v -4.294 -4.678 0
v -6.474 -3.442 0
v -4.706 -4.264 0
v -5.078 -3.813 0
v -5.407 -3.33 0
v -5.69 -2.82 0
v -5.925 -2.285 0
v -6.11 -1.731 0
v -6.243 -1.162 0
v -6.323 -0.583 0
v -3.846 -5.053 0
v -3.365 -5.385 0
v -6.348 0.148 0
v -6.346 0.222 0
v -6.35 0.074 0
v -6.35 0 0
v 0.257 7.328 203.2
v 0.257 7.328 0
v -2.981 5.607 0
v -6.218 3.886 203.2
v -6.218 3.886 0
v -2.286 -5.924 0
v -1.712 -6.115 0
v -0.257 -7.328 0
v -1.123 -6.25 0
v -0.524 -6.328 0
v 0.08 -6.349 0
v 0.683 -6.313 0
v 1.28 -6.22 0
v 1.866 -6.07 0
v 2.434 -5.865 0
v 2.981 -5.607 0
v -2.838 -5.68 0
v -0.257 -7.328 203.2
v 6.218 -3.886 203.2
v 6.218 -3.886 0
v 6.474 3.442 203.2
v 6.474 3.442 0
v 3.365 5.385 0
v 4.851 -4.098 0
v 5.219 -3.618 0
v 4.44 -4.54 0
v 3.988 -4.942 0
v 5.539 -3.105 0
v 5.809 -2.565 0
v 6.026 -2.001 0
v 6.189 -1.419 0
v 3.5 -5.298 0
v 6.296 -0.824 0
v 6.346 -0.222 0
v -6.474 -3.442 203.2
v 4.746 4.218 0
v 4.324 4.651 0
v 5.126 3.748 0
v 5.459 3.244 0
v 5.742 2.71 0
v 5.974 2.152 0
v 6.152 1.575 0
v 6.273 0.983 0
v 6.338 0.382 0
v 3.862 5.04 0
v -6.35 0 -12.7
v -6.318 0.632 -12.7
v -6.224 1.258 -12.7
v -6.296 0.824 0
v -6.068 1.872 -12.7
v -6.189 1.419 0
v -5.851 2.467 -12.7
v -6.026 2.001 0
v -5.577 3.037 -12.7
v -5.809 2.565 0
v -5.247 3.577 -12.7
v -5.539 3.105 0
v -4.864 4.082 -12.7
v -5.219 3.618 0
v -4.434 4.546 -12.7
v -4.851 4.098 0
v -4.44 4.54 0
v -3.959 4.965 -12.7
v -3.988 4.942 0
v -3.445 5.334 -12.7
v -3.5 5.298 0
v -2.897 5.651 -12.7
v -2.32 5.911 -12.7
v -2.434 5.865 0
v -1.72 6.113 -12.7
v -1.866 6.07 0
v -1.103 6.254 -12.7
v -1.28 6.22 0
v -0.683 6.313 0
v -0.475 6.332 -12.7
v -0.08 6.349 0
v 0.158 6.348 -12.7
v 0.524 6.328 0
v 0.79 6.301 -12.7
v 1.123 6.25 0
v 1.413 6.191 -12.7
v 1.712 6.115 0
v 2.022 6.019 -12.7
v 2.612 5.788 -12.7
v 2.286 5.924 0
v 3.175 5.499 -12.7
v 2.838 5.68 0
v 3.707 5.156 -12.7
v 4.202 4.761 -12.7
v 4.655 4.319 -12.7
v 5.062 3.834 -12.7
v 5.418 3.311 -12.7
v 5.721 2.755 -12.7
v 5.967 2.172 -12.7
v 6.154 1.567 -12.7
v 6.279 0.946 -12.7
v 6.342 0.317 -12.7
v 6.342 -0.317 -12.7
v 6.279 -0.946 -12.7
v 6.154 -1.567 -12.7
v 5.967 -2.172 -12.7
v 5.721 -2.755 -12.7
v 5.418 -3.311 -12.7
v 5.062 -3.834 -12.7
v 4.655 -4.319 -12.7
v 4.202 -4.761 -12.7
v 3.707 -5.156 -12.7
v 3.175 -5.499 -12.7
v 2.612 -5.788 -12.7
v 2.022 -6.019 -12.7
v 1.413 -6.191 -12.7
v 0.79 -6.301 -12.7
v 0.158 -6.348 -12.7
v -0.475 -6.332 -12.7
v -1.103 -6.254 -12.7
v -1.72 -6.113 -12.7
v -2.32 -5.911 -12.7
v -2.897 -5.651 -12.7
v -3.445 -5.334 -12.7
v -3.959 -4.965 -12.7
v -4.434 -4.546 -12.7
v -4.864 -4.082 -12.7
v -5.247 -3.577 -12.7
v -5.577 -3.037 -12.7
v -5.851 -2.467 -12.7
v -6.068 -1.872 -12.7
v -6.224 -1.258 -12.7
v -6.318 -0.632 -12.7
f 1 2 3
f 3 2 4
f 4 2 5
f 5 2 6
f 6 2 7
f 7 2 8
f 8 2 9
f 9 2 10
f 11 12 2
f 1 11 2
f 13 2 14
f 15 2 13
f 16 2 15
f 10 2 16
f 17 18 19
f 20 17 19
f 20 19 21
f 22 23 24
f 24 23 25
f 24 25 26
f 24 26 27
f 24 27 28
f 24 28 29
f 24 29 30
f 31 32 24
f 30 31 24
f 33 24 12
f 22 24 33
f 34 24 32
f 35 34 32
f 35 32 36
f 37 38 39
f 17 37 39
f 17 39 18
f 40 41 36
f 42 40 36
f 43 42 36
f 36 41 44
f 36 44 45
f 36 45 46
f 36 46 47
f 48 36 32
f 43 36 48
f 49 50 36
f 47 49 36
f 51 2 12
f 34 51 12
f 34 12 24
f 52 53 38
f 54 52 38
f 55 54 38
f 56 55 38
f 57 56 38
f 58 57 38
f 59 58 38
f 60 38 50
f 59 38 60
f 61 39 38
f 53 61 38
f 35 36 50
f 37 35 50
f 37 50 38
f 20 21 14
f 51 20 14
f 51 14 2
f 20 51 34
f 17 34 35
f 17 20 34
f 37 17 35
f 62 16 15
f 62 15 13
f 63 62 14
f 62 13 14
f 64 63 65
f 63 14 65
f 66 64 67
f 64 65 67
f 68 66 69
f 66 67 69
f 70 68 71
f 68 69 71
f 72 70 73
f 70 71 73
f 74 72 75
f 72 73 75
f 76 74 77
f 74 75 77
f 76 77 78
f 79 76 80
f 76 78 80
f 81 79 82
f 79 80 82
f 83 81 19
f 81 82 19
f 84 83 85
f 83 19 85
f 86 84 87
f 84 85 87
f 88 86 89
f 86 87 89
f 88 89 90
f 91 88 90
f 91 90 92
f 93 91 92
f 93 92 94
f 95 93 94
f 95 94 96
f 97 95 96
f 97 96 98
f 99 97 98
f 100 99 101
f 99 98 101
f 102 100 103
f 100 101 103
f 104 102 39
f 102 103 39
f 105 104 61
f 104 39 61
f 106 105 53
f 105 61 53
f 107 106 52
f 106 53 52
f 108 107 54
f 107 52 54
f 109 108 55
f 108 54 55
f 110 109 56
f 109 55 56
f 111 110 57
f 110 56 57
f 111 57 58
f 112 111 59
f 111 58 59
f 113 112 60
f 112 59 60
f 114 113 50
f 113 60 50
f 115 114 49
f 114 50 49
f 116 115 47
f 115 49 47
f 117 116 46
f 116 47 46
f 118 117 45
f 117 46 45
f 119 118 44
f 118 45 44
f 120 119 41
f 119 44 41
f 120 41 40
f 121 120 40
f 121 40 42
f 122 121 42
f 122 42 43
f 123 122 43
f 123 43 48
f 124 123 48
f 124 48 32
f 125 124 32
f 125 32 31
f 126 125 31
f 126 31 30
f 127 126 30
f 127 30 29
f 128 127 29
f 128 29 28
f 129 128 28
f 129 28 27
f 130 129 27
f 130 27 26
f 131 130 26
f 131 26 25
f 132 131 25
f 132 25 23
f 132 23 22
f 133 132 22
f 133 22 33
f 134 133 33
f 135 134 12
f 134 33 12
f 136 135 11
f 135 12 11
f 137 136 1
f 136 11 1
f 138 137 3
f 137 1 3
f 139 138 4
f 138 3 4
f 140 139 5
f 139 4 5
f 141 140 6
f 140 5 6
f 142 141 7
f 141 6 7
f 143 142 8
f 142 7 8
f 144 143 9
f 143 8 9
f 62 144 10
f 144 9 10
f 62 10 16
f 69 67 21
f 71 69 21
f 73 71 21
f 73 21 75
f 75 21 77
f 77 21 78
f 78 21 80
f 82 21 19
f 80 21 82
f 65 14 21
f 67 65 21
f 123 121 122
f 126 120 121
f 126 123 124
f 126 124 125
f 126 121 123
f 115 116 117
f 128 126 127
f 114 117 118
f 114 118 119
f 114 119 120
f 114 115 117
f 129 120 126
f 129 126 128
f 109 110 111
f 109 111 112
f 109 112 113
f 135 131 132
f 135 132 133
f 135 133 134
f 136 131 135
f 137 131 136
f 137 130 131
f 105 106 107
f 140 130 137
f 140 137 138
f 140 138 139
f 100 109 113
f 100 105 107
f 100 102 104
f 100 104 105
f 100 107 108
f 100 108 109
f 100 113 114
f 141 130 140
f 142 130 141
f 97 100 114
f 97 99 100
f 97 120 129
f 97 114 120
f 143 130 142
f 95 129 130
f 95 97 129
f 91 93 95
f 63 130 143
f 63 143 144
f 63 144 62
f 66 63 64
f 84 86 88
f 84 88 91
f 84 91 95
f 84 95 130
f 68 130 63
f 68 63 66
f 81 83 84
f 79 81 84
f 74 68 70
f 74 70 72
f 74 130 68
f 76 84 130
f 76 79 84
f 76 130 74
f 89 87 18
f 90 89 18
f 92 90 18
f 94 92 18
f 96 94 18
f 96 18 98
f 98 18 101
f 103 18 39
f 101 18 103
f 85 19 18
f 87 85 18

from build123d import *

# Parameters (mm, degrees)
BOSS_EXTRUDE1_DEPTH = 203.2
SKETCH2_R           = 6.35
BOSS_EXTRUDE2_DEPTH = 12.7


with BuildPart() as part:
    # Sketch1 → Boss-Extrude1 (new body)
    with BuildSketch(Plane.XY):
        Polygon((6.217819023, -3.88613689), (6.474402781, 3.441720786), (0.256583757, 7.327857675), (-6.217819023, 3.88613689), (-6.474402781, -3.441720786), (-0.256583757, -7.327857675), align=None)
    extrude(amount=BOSS_EXTRUDE1_DEPTH)

    # Sketch2 → Boss-Extrude2 (add)
    with BuildSketch(Plane(origin=(0, 0, 0), x_dir=(-1, 0, 0), z_dir=(0, 0, -1))):
        Circle(SKETCH2_R)
    extrude(amount=BOSS_EXTRUDE2_DEPTH)


solid = part.part
